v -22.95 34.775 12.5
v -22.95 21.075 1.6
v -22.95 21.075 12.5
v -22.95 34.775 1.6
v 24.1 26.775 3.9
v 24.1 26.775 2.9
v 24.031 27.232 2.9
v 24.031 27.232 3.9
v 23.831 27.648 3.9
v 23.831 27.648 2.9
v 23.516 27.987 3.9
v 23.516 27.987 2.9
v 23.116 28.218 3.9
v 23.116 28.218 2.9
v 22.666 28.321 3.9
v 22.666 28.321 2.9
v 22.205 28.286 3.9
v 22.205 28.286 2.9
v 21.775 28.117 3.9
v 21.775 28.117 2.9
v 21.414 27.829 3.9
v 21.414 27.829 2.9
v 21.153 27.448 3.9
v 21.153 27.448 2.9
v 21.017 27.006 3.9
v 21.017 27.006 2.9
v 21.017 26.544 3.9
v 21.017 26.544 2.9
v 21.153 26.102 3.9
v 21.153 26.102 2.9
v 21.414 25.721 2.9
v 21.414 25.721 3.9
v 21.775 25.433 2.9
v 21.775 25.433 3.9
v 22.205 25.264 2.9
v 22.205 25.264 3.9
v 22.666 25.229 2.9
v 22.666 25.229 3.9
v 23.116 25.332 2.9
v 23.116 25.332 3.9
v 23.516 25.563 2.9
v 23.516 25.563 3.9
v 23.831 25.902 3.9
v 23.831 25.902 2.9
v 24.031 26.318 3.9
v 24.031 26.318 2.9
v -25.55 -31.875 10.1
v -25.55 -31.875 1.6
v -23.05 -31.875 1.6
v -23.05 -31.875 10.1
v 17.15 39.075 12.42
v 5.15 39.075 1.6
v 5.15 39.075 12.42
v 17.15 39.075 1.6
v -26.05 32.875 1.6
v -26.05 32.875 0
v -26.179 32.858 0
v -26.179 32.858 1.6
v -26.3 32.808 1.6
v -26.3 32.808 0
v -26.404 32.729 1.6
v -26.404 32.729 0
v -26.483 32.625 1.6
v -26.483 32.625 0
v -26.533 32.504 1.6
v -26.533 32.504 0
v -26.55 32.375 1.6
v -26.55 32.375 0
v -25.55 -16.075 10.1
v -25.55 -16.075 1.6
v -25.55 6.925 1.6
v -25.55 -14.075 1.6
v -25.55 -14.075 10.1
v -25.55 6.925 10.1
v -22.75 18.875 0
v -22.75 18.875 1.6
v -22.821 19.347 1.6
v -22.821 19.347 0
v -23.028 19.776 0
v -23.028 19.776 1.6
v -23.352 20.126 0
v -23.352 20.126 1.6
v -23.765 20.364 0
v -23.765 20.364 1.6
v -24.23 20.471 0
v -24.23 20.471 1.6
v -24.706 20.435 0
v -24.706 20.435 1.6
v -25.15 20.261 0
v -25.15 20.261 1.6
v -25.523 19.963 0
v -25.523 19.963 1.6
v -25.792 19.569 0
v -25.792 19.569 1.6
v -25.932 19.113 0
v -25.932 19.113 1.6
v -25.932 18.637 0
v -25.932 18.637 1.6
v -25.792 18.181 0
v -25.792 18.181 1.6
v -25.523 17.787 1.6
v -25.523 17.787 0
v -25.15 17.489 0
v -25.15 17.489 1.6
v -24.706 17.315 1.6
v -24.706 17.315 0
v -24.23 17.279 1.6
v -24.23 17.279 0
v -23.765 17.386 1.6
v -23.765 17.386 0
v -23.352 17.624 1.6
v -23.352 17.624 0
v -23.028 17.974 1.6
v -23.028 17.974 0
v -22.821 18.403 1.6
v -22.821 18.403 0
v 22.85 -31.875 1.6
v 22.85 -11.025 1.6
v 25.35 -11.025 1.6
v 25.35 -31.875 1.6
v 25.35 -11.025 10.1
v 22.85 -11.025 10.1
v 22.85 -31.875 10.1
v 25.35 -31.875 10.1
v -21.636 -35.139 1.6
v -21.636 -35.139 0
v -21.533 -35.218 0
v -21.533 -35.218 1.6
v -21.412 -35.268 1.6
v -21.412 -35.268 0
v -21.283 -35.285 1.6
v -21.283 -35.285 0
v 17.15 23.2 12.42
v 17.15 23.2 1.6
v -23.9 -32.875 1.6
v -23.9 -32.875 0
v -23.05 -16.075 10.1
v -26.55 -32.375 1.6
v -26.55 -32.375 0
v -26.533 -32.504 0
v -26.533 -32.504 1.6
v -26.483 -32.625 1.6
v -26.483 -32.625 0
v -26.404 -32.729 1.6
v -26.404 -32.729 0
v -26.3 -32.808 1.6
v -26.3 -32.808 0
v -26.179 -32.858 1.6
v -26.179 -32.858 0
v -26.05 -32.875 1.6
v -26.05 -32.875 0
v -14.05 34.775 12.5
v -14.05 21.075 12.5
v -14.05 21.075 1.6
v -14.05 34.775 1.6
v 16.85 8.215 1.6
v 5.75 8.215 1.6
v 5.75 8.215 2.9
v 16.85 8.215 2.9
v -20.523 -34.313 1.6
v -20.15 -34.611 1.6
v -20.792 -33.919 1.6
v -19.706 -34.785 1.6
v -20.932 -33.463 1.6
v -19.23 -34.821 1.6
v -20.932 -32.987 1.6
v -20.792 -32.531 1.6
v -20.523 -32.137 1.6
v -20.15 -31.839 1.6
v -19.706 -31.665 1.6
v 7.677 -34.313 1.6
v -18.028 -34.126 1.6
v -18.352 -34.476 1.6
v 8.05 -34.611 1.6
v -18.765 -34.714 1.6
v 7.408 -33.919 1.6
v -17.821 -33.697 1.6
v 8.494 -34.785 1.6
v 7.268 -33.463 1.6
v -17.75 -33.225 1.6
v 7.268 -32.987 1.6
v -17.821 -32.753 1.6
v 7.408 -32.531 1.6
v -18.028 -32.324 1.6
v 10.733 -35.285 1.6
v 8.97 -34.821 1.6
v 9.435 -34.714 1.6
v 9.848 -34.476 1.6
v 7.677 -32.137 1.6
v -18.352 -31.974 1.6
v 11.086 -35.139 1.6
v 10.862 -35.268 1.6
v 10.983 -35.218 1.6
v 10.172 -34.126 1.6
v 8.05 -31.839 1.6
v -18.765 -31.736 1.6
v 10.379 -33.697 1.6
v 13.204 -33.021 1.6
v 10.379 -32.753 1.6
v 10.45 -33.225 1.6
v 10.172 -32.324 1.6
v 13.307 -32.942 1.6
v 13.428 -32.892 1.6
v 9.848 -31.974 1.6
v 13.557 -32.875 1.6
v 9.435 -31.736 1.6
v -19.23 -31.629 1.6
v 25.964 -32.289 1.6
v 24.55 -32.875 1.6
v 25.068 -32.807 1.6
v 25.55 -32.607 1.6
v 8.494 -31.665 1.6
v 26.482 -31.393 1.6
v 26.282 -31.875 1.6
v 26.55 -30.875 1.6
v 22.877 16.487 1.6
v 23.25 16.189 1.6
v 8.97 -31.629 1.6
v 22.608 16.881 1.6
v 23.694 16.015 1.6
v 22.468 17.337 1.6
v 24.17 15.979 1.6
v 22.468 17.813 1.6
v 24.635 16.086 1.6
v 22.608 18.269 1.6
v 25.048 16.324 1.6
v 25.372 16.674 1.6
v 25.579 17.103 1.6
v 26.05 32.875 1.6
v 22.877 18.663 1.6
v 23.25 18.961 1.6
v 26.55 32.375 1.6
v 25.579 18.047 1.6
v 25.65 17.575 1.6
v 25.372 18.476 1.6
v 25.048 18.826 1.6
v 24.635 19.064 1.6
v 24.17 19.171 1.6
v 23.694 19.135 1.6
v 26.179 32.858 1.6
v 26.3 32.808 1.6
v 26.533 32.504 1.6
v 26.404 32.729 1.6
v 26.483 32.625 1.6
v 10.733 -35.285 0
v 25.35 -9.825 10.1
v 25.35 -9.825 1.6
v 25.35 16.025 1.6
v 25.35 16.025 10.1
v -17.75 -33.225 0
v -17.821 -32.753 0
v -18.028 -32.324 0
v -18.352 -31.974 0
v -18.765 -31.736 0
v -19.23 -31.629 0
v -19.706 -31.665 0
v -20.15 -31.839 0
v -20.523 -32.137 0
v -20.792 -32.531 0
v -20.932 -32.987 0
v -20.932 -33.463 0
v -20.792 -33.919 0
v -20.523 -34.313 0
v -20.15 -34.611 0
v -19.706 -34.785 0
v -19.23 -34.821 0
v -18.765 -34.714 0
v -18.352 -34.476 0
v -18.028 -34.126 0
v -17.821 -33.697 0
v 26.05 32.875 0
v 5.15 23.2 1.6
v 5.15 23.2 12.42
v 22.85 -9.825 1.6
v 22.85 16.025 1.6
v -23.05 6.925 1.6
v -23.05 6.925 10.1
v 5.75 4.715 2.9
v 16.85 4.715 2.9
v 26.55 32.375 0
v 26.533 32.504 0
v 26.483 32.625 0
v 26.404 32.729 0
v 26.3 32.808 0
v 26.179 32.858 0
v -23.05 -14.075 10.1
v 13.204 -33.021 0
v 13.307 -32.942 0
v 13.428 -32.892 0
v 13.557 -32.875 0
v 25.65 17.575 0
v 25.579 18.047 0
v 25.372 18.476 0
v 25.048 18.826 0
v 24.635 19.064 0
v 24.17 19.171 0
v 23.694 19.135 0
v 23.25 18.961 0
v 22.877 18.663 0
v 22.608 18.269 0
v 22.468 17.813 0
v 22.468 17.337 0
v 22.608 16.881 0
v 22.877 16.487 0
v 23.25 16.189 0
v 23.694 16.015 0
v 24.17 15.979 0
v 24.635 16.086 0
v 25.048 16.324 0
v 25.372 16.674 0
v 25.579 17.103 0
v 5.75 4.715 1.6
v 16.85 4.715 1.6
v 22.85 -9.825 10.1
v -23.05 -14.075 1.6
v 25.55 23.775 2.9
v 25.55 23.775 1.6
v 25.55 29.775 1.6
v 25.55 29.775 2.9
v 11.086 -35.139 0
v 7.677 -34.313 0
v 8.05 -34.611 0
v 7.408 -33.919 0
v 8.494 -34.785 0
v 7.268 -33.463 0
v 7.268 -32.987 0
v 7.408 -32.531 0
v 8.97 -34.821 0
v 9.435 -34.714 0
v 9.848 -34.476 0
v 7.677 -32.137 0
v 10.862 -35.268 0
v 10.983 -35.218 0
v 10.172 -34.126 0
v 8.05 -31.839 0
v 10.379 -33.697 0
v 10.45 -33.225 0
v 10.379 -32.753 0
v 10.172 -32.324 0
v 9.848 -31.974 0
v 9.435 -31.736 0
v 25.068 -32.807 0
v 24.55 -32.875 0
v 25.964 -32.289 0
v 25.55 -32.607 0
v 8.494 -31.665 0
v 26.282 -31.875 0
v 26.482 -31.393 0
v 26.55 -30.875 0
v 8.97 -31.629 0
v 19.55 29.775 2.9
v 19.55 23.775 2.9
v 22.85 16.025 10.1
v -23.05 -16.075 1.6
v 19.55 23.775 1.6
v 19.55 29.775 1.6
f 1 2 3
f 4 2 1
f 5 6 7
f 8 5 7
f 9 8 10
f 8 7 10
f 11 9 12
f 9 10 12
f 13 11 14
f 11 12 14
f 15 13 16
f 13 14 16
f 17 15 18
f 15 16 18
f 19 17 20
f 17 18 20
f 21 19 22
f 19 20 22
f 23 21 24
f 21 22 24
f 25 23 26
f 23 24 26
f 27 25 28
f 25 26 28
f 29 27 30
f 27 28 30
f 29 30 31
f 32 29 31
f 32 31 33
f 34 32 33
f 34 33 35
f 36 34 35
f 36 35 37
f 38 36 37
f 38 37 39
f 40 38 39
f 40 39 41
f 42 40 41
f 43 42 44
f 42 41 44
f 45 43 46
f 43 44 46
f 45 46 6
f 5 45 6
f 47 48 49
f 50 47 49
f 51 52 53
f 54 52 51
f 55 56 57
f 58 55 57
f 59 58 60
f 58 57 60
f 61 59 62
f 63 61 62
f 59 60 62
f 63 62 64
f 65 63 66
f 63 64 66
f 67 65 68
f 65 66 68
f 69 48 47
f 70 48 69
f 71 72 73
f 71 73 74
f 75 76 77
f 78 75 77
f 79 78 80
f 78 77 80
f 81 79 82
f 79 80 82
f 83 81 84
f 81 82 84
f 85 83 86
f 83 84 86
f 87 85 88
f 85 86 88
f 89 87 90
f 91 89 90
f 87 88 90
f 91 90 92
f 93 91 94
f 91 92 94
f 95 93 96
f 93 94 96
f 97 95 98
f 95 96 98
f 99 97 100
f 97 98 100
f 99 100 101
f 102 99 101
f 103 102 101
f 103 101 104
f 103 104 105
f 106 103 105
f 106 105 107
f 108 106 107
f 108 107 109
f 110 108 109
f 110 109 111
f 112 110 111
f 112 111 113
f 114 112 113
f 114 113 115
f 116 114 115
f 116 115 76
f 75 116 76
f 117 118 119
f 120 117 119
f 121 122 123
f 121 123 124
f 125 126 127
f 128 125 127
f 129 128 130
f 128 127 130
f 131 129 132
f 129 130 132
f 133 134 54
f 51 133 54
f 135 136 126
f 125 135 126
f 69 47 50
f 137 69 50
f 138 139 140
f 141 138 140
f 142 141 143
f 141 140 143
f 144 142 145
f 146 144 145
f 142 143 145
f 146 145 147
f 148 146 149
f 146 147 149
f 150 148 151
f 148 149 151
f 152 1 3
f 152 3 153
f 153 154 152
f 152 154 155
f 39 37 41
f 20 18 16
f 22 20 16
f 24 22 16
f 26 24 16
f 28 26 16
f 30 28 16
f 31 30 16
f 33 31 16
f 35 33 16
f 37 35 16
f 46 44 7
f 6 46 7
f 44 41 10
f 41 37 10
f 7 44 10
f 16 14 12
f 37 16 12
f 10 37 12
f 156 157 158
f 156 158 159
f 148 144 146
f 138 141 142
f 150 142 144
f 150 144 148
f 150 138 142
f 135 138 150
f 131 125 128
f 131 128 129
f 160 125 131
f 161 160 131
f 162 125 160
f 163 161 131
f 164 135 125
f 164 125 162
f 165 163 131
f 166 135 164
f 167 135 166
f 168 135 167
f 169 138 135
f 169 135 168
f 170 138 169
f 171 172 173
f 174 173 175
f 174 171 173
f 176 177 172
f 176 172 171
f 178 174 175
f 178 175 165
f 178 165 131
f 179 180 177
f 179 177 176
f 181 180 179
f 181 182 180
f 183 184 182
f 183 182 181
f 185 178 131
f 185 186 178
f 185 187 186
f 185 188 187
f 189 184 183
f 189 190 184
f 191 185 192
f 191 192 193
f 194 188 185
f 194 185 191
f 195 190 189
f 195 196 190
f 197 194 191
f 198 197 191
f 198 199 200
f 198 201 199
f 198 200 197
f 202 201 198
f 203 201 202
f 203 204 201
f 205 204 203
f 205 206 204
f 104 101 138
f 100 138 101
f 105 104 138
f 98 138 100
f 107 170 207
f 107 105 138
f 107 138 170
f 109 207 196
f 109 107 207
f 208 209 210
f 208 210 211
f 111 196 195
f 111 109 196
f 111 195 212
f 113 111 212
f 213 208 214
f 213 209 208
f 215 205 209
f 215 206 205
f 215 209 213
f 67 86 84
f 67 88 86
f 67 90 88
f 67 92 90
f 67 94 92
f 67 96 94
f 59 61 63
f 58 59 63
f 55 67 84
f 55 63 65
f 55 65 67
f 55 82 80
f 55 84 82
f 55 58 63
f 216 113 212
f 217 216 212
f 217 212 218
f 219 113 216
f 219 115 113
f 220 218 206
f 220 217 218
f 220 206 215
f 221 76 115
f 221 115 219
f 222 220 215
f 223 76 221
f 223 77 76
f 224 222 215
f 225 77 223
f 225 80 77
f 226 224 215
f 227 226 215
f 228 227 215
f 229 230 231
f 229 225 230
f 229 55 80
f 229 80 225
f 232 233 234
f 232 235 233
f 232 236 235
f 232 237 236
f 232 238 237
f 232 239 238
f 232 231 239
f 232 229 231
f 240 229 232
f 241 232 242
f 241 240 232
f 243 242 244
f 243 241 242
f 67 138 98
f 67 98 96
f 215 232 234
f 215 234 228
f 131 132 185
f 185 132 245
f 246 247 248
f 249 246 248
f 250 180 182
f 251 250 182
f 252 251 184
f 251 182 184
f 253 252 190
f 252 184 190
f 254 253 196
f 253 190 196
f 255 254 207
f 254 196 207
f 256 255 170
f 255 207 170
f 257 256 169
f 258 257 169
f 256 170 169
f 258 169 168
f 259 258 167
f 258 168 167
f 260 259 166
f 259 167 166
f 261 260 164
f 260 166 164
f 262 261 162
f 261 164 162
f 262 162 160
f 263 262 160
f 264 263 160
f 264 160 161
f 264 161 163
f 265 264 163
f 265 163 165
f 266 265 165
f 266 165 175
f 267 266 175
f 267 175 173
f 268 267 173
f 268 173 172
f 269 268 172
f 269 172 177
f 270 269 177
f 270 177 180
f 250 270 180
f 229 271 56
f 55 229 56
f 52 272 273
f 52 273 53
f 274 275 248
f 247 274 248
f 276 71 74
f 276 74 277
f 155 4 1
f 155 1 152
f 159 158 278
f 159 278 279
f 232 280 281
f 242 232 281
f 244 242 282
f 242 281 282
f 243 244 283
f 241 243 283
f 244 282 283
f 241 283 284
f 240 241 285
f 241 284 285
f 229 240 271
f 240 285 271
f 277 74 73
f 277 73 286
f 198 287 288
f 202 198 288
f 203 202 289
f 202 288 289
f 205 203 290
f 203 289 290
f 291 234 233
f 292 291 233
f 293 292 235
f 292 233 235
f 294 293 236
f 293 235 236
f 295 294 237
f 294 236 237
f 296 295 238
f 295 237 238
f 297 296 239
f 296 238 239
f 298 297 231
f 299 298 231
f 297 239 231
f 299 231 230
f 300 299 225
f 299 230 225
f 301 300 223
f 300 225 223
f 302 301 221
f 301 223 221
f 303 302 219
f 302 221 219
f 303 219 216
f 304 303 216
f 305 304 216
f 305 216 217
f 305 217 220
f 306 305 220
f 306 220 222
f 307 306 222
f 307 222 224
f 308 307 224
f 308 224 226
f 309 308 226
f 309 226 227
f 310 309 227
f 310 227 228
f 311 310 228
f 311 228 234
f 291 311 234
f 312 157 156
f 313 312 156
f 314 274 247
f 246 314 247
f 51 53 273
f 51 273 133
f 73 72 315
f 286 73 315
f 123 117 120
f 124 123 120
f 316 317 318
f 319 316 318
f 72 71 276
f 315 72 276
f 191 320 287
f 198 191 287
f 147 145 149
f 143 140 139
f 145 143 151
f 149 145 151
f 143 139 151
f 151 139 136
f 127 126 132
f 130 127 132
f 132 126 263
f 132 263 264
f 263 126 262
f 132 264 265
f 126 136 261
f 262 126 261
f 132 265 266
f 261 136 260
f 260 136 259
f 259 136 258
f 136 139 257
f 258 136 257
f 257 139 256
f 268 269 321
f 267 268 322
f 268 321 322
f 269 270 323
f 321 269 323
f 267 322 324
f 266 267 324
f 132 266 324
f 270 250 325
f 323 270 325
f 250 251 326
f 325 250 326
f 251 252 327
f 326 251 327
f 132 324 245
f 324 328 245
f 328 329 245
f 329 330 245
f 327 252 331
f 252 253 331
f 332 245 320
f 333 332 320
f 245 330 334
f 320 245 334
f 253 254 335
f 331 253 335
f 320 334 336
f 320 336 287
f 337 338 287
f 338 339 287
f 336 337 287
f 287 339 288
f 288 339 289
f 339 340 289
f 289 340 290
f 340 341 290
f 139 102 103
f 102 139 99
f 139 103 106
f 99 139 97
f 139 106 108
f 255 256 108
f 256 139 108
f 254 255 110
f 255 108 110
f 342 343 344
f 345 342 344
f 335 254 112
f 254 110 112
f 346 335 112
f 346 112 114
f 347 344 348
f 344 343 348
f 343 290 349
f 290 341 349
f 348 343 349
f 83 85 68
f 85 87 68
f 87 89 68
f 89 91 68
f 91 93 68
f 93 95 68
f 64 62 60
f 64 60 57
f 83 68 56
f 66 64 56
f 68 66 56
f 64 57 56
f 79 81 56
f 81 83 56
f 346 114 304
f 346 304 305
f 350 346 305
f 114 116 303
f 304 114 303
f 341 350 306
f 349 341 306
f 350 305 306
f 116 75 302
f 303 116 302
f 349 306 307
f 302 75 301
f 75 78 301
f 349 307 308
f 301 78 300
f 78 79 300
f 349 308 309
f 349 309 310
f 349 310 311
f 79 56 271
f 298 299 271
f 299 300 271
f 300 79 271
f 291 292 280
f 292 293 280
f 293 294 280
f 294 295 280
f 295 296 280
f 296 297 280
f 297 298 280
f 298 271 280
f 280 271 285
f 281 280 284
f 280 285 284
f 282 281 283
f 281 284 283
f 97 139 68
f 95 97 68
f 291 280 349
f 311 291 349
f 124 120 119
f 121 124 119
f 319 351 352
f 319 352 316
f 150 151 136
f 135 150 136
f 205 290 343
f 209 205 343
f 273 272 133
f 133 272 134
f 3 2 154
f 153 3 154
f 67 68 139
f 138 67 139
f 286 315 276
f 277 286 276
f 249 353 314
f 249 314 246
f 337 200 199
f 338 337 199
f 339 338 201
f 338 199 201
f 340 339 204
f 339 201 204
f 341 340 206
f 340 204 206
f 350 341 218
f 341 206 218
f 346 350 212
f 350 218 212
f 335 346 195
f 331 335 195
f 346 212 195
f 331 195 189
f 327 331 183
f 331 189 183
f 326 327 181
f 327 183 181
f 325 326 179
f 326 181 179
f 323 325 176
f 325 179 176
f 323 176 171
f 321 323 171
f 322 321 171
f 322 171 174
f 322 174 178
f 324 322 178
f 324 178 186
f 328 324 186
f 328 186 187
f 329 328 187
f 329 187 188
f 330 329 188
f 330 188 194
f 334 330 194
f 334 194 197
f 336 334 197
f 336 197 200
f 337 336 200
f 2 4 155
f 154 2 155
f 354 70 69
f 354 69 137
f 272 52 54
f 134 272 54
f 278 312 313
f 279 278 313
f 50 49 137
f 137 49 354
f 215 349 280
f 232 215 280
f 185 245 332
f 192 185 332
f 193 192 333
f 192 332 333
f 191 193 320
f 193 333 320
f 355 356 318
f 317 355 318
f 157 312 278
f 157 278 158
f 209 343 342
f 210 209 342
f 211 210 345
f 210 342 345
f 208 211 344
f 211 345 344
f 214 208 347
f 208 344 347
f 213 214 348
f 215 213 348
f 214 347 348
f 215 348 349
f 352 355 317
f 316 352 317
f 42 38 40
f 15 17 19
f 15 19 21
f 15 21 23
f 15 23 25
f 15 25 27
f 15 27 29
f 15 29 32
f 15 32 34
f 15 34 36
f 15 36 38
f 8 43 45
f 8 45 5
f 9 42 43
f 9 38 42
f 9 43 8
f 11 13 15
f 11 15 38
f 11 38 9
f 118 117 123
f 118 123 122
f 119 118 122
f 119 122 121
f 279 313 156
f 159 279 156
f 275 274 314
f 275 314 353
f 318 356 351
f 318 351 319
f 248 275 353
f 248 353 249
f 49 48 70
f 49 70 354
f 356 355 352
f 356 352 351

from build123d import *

# Parameters (mm, degrees)
F1_DEPTH  = 1.6
F2_W      = 12
F2_H      = 15.875
F3_DEPTH  = 10.82
F4_W      = 8.9
F4_H      = 13.7
F5_DEPTH  = 10.9
F6_R      = 1.6
F7_DEPTH  = 3
F8_W      = 2.5
F8_H      = 25.85
F9_DEPTH  = 8.5
F8_H_2    = 20.85
F8_H_3    = 21
F8_H_4    = 15.8
F10_W     = 6
F10_H     = 6
F11_DEPTH = 1.3
F12_R     = 1.55
F13_DEPTH = 1
F14_W     = 11.1
F14_H     = 3.5
F15_DEPTH = 1.3


with BuildPart() as f1:
    # F0 (on Top) → F1 (new body)
    with BuildSketch(Plane.XY):
        with BuildLine():
            Line((26.05, 32.875), (-26.05, 32.875))
            ThreePointArc((-26.05, 32.875), (-26.4035533906, 32.7285533906), (-26.55, 32.375))
            Line((-26.55, 32.375), (-26.55, -32.375))
            ThreePointArc((-26.55, -32.375), (-26.4035533906, -32.7285533906), (-26.05, -32.875))
            Line((-26.05, -32.875), (-23.9, -32.875))
            Line((-23.9, -32.875), (-21.6364466094, -35.1385533906))
            ThreePointArc((-21.6364466094, -35.1385533906), (-21.474234935, -35.2469397663), (-21.2828932188, -35.285))
            Line((-21.2828932188, -35.285), (10.7328932188, -35.285))
            ThreePointArc((10.7328932188, -35.285), (10.924234935, -35.2469397663), (11.0864466094, -35.1385533906))
            Line((11.0864466094, -35.1385533906), (13.2035533906, -33.0214466094))
            ThreePointArc((13.2035533906, -33.0214466094), (13.365765065, -32.9130602337), (13.5571067812, -32.875))
            Line((13.5571067812, -32.875), (24.55, -32.875))
            ThreePointArc((24.55, -32.875), (25.9642135624, -32.2892135624), (26.55, -30.875))
            Line((26.55, -30.875), (26.55, 32.375))
            ThreePointArc((26.55, 32.375), (26.4035533906, 32.7285533906), (26.05, 32.875))
        make_face()
    extrude(amount=F1_DEPTH)

    # F6 (on face) → F7 (cut)
    with BuildSketch(Plane.XY.offset(1.6)):
        with Locations((-19.35, -33.225)):
            Circle(F6_R)
        with Locations((8.85, -33.225)):
            Circle(F6_R)
        with Locations((24.05, 17.575)):
            Circle(F6_R)
        with Locations((-24.35, 18.875)):
            Circle(F6_R)
    extrude(amount=-F7_DEPTH, mode=Mode.SUBTRACT)


with BuildPart() as f3:
    # F2 (on face) → F3 (new body)
    with BuildSketch(Plane.XY.offset(1.6)):
        with Locations((11.15, 31.1375)):
            Rectangle(F2_W, F2_H)
    extrude(amount=F3_DEPTH)


with BuildPart() as f5:
    # F4 (on face) → F5 (new body)
    with BuildSketch(Plane.XY.offset(1.6)):
        with Locations((-18.5, 27.925)):
            Rectangle(F4_W, F4_H)
    extrude(amount=F5_DEPTH)


with BuildPart() as f9:
    # F8 (on face) → F9 (new body)
    with BuildSketch(Plane.XY.offset(1.6)):
        with Locations((24.1, 3.1)):
            Rectangle(F8_W, F8_H)
    extrude(amount=F9_DEPTH)


with BuildPart() as f9b:
    # F8 (on face) → F9, piece 2 (new body)
    with BuildSketch(Plane.XY.offset(1.6)):
        with Locations((24.1, -21.45)):
            Rectangle(F8_W, F8_H_2)
    extrude(amount=F9_DEPTH)


with BuildPart() as f9c:
    # F8 (on face) → F9, piece 3 (new body)
    with BuildSketch(Plane.XY.offset(1.6)):
        with Locations((-24.3, -3.575)):
            Rectangle(F8_W, F8_H_3)
    extrude(amount=F9_DEPTH)


with BuildPart() as f9d:
    # F8 (on face) → F9, piece 4 (new body)
    with BuildSketch(Plane.XY.offset(1.6)):
        with Locations((-24.3, -23.975)):
            Rectangle(F8_W, F8_H_4)
    extrude(amount=F9_DEPTH)


with BuildPart() as f11:
    # F10 (on face) → F11 (new body)
    with BuildSketch(Plane.XY.offset(1.6)):
        with Locations((22.55, 26.775)):
            Rectangle(F10_W, F10_H)
    extrude(amount=F11_DEPTH)


with BuildPart() as f13:
    # F12 (on face) → F13 (new body)
    with BuildSketch(Plane.XY.offset(2.9)):
        with Locations((22.55, 26.775)):
            Circle(F12_R)
    extrude(amount=F13_DEPTH)


with BuildPart() as f15:
    # F14 (on face) → F15 (new body)
    with BuildSketch(Plane.XY.offset(1.6)):
        with Locations((11.3, 6.465)):
            Rectangle(F14_W, F14_H)
    extrude(amount=F15_DEPTH)


solid = Compound([f1.part, f3.part, f5.part, f9.part, f9b.part, f9c.part, f9d.part, f11.part, f13.part, f15.part])
